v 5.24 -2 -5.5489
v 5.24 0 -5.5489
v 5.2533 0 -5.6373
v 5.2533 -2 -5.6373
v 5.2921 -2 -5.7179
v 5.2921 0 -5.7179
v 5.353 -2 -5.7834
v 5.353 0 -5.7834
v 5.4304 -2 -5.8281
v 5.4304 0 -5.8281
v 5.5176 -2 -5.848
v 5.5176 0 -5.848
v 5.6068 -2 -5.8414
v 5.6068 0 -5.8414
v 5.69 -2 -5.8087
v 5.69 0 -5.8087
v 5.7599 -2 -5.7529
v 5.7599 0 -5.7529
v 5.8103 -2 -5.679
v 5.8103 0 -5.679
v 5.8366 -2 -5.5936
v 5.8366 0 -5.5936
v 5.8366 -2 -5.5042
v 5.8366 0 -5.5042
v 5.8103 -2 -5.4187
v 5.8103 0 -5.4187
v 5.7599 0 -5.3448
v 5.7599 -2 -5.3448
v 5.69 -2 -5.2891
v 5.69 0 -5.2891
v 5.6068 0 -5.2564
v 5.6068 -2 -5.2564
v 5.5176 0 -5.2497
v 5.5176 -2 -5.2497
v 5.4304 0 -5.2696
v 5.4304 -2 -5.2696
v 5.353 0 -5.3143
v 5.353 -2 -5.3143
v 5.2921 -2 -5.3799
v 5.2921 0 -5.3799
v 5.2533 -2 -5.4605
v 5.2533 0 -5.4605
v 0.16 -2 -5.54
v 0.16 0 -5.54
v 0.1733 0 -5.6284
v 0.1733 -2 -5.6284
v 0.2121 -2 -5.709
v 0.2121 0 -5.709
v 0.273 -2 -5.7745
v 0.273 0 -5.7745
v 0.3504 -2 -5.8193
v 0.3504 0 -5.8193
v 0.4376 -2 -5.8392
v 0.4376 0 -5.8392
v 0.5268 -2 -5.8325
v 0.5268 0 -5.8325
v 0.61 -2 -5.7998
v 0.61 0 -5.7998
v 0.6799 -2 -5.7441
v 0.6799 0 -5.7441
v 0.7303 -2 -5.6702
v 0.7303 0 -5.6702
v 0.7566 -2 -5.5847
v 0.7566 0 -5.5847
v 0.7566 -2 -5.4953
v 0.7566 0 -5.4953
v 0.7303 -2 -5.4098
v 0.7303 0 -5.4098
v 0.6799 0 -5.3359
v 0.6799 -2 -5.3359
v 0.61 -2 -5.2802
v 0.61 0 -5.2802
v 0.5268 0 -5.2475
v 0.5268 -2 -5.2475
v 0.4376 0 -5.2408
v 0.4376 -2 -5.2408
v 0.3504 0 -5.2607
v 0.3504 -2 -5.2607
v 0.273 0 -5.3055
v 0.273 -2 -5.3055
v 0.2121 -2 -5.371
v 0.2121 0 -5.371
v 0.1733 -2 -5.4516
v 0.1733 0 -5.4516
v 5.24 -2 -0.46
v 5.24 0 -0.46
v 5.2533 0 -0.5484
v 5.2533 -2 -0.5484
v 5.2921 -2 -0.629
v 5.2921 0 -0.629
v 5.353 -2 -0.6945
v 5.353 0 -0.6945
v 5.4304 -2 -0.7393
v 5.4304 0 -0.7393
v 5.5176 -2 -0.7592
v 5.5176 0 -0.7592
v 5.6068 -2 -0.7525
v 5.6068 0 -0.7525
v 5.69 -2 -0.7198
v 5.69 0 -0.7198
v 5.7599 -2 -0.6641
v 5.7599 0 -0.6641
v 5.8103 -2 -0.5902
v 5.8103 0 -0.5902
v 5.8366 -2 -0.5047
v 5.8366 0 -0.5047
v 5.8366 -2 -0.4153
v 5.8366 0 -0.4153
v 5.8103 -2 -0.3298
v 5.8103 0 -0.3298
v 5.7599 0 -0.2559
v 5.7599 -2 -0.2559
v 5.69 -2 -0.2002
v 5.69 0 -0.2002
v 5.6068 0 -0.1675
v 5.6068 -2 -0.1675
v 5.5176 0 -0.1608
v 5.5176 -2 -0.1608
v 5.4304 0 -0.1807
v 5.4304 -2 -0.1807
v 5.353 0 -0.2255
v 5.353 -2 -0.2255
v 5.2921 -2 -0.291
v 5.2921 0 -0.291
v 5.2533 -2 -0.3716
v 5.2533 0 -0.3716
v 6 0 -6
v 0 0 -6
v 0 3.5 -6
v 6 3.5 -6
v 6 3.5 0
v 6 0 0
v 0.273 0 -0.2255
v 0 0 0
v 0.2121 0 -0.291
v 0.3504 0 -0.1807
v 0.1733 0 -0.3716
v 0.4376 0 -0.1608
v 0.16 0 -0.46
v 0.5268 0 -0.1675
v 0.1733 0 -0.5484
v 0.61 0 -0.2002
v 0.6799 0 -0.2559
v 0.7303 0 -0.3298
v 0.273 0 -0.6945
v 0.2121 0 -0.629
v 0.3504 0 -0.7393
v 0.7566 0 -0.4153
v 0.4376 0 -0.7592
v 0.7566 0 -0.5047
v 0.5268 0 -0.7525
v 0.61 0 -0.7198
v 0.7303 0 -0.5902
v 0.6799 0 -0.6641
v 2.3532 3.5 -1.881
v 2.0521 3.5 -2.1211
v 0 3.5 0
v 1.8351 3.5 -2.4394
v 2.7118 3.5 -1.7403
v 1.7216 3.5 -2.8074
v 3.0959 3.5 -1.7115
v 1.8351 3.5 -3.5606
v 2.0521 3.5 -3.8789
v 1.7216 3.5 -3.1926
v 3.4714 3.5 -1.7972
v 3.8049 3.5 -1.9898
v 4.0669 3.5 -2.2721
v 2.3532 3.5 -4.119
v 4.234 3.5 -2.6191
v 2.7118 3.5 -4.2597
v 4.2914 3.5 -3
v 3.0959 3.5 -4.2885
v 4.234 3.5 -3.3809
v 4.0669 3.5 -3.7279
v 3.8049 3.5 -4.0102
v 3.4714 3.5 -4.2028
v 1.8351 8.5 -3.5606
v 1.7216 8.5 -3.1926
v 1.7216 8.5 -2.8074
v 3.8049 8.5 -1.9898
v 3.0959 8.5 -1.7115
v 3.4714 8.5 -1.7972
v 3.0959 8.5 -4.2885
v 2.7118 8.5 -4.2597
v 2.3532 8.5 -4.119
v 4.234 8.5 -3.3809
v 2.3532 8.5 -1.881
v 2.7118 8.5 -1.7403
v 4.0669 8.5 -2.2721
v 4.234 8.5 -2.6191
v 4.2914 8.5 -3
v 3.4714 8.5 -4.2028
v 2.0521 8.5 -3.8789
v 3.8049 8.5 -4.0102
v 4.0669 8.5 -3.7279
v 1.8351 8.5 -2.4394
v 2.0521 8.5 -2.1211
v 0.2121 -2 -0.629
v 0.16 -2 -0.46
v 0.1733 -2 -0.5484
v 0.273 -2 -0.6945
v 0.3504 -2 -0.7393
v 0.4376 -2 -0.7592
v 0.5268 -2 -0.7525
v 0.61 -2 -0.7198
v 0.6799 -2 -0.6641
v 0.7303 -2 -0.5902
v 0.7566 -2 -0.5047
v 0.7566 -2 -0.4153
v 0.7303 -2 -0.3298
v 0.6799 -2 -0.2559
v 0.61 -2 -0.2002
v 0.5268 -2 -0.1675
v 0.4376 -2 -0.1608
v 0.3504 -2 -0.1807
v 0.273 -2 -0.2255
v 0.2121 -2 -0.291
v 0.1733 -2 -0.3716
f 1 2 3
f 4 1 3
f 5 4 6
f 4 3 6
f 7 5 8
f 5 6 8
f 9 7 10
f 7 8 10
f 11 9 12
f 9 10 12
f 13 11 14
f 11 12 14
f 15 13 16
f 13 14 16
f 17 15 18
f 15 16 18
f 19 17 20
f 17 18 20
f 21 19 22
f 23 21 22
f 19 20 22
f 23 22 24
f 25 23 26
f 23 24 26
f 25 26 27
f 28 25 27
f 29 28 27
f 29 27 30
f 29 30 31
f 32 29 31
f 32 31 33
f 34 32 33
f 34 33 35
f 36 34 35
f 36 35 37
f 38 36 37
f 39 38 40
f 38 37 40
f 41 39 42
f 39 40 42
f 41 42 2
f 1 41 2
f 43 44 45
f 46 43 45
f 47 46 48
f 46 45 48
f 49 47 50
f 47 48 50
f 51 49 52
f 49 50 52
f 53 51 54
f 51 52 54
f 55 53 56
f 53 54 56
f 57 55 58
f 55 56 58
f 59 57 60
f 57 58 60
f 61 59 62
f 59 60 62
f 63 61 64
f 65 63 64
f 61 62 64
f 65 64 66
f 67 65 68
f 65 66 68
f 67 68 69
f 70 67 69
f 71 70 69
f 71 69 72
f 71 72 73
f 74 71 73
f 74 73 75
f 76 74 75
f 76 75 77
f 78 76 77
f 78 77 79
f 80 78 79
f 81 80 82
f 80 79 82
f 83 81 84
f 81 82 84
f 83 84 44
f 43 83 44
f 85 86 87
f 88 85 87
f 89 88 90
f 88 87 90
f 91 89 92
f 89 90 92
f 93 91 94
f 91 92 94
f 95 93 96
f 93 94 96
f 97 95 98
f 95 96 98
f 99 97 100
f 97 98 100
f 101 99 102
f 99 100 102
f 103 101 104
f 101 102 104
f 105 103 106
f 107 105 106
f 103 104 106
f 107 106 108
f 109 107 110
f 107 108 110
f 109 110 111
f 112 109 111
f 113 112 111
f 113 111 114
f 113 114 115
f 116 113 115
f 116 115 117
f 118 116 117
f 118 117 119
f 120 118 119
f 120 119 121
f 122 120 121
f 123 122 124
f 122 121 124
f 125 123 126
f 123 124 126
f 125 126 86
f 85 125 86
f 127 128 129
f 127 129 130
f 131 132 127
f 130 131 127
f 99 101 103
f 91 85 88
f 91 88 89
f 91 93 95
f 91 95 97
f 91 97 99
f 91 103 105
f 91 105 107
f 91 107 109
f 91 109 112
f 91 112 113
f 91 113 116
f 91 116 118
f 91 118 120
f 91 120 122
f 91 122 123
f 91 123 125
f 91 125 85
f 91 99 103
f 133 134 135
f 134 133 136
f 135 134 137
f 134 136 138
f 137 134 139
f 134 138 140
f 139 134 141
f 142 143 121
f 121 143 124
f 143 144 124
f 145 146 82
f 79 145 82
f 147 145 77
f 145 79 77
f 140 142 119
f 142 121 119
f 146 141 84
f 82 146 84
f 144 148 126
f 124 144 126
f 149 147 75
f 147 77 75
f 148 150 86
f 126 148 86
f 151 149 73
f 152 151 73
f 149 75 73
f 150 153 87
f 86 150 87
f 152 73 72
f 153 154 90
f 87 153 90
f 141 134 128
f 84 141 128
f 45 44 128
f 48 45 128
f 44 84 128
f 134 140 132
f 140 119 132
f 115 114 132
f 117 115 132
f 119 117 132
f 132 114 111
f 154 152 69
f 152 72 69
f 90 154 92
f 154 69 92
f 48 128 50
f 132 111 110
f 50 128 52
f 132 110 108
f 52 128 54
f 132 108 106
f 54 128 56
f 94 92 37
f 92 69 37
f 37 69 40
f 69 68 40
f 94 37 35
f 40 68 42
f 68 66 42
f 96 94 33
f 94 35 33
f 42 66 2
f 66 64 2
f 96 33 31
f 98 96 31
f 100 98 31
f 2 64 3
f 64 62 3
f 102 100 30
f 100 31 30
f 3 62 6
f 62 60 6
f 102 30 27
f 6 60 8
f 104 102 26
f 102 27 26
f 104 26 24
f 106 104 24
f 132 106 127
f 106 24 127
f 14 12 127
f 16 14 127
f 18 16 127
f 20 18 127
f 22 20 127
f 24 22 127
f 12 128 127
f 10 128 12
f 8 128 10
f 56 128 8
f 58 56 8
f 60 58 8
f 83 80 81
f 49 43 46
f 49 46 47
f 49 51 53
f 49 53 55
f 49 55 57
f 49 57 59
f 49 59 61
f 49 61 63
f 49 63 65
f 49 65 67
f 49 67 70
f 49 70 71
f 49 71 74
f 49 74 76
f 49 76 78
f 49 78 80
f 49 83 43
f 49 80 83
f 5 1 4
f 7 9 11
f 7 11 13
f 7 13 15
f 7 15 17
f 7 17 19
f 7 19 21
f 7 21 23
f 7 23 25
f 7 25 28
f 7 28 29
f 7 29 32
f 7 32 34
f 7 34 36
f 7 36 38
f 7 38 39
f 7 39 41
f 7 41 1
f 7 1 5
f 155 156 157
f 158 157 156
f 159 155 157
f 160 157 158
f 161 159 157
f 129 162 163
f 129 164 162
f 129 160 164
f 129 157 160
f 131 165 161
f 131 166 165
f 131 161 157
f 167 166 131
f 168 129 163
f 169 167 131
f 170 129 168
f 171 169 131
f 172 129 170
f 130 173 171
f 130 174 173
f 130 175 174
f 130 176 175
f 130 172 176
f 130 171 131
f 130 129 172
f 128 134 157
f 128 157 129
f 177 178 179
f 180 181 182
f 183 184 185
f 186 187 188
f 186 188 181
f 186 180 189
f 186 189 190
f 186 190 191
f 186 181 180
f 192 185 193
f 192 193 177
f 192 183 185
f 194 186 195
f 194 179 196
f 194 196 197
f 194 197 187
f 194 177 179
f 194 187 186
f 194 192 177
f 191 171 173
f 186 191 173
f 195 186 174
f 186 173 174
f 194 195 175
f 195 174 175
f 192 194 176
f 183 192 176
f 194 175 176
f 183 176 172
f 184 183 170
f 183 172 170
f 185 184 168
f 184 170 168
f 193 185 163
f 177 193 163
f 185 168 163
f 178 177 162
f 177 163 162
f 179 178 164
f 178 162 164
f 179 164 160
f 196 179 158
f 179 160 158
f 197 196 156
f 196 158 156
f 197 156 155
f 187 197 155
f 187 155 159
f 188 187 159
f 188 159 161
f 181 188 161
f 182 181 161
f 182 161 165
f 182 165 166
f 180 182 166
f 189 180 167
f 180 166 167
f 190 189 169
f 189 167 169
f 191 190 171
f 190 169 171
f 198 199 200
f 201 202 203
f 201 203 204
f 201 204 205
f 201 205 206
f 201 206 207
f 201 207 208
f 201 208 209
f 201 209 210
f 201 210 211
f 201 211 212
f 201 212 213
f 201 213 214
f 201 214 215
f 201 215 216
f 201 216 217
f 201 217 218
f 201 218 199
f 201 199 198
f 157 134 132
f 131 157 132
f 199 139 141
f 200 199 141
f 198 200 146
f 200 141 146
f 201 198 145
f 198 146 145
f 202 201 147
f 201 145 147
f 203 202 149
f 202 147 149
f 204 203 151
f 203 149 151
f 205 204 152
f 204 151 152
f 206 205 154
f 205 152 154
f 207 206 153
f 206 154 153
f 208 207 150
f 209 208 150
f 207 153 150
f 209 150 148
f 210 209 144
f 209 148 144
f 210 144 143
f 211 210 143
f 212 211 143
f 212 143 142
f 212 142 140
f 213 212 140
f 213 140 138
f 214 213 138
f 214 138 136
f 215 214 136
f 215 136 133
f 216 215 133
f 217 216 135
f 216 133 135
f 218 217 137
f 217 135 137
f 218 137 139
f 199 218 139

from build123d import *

# Parameters (mm, degrees)
SKETCH1_W           = 6
SKETCH1_H           = 6
BOSS_EXTRUDE1_DEPTH = 3.5
SKETCH2_R           = 1.292115179
BOSS_EXTRUDE2_DEPTH = 5
SKETCH3_R           = 0.3
BOSS_EXTRUDE3_DEPTH = 2


with BuildPart() as part:
    # Sketch1 → Boss-Extrude1 (new body)
    with BuildSketch(Plane(origin=(0, 0, 0), x_dir=(1, 0, 0), z_dir=(0, 1, 0))):
        with Locations((3, 3)):
            Rectangle(SKETCH1_W, SKETCH1_H)
    extrude(amount=BOSS_EXTRUDE1_DEPTH)

    # Sketch2 → Boss-Extrude2 (add)
    with BuildSketch(Plane(origin=(0, 3.5, 0), x_dir=(1, 0, 0), z_dir=(0, 1, 0))):
        with Locations((2.999291, 3)):
            Circle(SKETCH2_R)
    extrude(amount=BOSS_EXTRUDE2_DEPTH)

    # Sketch3 → Boss-Extrude3 (add)
    with BuildSketch(Plane(origin=(0, 0, 0), x_dir=(-1, 0, 0), z_dir=(0, -1, 0))):
        with Locations((-0.46, 0.46)):
            Circle(SKETCH3_R)
        with Locations((-5.54, 0.46)):
            Circle(SKETCH3_R)
        with Locations((-0.46, 5.54)):
            Circle(SKETCH3_R)
        with Locations((-5.54, 5.548881257)):
            Circle(SKETCH3_R)
    extrude(amount=BOSS_EXTRUDE3_DEPTH)


solid = part.part
